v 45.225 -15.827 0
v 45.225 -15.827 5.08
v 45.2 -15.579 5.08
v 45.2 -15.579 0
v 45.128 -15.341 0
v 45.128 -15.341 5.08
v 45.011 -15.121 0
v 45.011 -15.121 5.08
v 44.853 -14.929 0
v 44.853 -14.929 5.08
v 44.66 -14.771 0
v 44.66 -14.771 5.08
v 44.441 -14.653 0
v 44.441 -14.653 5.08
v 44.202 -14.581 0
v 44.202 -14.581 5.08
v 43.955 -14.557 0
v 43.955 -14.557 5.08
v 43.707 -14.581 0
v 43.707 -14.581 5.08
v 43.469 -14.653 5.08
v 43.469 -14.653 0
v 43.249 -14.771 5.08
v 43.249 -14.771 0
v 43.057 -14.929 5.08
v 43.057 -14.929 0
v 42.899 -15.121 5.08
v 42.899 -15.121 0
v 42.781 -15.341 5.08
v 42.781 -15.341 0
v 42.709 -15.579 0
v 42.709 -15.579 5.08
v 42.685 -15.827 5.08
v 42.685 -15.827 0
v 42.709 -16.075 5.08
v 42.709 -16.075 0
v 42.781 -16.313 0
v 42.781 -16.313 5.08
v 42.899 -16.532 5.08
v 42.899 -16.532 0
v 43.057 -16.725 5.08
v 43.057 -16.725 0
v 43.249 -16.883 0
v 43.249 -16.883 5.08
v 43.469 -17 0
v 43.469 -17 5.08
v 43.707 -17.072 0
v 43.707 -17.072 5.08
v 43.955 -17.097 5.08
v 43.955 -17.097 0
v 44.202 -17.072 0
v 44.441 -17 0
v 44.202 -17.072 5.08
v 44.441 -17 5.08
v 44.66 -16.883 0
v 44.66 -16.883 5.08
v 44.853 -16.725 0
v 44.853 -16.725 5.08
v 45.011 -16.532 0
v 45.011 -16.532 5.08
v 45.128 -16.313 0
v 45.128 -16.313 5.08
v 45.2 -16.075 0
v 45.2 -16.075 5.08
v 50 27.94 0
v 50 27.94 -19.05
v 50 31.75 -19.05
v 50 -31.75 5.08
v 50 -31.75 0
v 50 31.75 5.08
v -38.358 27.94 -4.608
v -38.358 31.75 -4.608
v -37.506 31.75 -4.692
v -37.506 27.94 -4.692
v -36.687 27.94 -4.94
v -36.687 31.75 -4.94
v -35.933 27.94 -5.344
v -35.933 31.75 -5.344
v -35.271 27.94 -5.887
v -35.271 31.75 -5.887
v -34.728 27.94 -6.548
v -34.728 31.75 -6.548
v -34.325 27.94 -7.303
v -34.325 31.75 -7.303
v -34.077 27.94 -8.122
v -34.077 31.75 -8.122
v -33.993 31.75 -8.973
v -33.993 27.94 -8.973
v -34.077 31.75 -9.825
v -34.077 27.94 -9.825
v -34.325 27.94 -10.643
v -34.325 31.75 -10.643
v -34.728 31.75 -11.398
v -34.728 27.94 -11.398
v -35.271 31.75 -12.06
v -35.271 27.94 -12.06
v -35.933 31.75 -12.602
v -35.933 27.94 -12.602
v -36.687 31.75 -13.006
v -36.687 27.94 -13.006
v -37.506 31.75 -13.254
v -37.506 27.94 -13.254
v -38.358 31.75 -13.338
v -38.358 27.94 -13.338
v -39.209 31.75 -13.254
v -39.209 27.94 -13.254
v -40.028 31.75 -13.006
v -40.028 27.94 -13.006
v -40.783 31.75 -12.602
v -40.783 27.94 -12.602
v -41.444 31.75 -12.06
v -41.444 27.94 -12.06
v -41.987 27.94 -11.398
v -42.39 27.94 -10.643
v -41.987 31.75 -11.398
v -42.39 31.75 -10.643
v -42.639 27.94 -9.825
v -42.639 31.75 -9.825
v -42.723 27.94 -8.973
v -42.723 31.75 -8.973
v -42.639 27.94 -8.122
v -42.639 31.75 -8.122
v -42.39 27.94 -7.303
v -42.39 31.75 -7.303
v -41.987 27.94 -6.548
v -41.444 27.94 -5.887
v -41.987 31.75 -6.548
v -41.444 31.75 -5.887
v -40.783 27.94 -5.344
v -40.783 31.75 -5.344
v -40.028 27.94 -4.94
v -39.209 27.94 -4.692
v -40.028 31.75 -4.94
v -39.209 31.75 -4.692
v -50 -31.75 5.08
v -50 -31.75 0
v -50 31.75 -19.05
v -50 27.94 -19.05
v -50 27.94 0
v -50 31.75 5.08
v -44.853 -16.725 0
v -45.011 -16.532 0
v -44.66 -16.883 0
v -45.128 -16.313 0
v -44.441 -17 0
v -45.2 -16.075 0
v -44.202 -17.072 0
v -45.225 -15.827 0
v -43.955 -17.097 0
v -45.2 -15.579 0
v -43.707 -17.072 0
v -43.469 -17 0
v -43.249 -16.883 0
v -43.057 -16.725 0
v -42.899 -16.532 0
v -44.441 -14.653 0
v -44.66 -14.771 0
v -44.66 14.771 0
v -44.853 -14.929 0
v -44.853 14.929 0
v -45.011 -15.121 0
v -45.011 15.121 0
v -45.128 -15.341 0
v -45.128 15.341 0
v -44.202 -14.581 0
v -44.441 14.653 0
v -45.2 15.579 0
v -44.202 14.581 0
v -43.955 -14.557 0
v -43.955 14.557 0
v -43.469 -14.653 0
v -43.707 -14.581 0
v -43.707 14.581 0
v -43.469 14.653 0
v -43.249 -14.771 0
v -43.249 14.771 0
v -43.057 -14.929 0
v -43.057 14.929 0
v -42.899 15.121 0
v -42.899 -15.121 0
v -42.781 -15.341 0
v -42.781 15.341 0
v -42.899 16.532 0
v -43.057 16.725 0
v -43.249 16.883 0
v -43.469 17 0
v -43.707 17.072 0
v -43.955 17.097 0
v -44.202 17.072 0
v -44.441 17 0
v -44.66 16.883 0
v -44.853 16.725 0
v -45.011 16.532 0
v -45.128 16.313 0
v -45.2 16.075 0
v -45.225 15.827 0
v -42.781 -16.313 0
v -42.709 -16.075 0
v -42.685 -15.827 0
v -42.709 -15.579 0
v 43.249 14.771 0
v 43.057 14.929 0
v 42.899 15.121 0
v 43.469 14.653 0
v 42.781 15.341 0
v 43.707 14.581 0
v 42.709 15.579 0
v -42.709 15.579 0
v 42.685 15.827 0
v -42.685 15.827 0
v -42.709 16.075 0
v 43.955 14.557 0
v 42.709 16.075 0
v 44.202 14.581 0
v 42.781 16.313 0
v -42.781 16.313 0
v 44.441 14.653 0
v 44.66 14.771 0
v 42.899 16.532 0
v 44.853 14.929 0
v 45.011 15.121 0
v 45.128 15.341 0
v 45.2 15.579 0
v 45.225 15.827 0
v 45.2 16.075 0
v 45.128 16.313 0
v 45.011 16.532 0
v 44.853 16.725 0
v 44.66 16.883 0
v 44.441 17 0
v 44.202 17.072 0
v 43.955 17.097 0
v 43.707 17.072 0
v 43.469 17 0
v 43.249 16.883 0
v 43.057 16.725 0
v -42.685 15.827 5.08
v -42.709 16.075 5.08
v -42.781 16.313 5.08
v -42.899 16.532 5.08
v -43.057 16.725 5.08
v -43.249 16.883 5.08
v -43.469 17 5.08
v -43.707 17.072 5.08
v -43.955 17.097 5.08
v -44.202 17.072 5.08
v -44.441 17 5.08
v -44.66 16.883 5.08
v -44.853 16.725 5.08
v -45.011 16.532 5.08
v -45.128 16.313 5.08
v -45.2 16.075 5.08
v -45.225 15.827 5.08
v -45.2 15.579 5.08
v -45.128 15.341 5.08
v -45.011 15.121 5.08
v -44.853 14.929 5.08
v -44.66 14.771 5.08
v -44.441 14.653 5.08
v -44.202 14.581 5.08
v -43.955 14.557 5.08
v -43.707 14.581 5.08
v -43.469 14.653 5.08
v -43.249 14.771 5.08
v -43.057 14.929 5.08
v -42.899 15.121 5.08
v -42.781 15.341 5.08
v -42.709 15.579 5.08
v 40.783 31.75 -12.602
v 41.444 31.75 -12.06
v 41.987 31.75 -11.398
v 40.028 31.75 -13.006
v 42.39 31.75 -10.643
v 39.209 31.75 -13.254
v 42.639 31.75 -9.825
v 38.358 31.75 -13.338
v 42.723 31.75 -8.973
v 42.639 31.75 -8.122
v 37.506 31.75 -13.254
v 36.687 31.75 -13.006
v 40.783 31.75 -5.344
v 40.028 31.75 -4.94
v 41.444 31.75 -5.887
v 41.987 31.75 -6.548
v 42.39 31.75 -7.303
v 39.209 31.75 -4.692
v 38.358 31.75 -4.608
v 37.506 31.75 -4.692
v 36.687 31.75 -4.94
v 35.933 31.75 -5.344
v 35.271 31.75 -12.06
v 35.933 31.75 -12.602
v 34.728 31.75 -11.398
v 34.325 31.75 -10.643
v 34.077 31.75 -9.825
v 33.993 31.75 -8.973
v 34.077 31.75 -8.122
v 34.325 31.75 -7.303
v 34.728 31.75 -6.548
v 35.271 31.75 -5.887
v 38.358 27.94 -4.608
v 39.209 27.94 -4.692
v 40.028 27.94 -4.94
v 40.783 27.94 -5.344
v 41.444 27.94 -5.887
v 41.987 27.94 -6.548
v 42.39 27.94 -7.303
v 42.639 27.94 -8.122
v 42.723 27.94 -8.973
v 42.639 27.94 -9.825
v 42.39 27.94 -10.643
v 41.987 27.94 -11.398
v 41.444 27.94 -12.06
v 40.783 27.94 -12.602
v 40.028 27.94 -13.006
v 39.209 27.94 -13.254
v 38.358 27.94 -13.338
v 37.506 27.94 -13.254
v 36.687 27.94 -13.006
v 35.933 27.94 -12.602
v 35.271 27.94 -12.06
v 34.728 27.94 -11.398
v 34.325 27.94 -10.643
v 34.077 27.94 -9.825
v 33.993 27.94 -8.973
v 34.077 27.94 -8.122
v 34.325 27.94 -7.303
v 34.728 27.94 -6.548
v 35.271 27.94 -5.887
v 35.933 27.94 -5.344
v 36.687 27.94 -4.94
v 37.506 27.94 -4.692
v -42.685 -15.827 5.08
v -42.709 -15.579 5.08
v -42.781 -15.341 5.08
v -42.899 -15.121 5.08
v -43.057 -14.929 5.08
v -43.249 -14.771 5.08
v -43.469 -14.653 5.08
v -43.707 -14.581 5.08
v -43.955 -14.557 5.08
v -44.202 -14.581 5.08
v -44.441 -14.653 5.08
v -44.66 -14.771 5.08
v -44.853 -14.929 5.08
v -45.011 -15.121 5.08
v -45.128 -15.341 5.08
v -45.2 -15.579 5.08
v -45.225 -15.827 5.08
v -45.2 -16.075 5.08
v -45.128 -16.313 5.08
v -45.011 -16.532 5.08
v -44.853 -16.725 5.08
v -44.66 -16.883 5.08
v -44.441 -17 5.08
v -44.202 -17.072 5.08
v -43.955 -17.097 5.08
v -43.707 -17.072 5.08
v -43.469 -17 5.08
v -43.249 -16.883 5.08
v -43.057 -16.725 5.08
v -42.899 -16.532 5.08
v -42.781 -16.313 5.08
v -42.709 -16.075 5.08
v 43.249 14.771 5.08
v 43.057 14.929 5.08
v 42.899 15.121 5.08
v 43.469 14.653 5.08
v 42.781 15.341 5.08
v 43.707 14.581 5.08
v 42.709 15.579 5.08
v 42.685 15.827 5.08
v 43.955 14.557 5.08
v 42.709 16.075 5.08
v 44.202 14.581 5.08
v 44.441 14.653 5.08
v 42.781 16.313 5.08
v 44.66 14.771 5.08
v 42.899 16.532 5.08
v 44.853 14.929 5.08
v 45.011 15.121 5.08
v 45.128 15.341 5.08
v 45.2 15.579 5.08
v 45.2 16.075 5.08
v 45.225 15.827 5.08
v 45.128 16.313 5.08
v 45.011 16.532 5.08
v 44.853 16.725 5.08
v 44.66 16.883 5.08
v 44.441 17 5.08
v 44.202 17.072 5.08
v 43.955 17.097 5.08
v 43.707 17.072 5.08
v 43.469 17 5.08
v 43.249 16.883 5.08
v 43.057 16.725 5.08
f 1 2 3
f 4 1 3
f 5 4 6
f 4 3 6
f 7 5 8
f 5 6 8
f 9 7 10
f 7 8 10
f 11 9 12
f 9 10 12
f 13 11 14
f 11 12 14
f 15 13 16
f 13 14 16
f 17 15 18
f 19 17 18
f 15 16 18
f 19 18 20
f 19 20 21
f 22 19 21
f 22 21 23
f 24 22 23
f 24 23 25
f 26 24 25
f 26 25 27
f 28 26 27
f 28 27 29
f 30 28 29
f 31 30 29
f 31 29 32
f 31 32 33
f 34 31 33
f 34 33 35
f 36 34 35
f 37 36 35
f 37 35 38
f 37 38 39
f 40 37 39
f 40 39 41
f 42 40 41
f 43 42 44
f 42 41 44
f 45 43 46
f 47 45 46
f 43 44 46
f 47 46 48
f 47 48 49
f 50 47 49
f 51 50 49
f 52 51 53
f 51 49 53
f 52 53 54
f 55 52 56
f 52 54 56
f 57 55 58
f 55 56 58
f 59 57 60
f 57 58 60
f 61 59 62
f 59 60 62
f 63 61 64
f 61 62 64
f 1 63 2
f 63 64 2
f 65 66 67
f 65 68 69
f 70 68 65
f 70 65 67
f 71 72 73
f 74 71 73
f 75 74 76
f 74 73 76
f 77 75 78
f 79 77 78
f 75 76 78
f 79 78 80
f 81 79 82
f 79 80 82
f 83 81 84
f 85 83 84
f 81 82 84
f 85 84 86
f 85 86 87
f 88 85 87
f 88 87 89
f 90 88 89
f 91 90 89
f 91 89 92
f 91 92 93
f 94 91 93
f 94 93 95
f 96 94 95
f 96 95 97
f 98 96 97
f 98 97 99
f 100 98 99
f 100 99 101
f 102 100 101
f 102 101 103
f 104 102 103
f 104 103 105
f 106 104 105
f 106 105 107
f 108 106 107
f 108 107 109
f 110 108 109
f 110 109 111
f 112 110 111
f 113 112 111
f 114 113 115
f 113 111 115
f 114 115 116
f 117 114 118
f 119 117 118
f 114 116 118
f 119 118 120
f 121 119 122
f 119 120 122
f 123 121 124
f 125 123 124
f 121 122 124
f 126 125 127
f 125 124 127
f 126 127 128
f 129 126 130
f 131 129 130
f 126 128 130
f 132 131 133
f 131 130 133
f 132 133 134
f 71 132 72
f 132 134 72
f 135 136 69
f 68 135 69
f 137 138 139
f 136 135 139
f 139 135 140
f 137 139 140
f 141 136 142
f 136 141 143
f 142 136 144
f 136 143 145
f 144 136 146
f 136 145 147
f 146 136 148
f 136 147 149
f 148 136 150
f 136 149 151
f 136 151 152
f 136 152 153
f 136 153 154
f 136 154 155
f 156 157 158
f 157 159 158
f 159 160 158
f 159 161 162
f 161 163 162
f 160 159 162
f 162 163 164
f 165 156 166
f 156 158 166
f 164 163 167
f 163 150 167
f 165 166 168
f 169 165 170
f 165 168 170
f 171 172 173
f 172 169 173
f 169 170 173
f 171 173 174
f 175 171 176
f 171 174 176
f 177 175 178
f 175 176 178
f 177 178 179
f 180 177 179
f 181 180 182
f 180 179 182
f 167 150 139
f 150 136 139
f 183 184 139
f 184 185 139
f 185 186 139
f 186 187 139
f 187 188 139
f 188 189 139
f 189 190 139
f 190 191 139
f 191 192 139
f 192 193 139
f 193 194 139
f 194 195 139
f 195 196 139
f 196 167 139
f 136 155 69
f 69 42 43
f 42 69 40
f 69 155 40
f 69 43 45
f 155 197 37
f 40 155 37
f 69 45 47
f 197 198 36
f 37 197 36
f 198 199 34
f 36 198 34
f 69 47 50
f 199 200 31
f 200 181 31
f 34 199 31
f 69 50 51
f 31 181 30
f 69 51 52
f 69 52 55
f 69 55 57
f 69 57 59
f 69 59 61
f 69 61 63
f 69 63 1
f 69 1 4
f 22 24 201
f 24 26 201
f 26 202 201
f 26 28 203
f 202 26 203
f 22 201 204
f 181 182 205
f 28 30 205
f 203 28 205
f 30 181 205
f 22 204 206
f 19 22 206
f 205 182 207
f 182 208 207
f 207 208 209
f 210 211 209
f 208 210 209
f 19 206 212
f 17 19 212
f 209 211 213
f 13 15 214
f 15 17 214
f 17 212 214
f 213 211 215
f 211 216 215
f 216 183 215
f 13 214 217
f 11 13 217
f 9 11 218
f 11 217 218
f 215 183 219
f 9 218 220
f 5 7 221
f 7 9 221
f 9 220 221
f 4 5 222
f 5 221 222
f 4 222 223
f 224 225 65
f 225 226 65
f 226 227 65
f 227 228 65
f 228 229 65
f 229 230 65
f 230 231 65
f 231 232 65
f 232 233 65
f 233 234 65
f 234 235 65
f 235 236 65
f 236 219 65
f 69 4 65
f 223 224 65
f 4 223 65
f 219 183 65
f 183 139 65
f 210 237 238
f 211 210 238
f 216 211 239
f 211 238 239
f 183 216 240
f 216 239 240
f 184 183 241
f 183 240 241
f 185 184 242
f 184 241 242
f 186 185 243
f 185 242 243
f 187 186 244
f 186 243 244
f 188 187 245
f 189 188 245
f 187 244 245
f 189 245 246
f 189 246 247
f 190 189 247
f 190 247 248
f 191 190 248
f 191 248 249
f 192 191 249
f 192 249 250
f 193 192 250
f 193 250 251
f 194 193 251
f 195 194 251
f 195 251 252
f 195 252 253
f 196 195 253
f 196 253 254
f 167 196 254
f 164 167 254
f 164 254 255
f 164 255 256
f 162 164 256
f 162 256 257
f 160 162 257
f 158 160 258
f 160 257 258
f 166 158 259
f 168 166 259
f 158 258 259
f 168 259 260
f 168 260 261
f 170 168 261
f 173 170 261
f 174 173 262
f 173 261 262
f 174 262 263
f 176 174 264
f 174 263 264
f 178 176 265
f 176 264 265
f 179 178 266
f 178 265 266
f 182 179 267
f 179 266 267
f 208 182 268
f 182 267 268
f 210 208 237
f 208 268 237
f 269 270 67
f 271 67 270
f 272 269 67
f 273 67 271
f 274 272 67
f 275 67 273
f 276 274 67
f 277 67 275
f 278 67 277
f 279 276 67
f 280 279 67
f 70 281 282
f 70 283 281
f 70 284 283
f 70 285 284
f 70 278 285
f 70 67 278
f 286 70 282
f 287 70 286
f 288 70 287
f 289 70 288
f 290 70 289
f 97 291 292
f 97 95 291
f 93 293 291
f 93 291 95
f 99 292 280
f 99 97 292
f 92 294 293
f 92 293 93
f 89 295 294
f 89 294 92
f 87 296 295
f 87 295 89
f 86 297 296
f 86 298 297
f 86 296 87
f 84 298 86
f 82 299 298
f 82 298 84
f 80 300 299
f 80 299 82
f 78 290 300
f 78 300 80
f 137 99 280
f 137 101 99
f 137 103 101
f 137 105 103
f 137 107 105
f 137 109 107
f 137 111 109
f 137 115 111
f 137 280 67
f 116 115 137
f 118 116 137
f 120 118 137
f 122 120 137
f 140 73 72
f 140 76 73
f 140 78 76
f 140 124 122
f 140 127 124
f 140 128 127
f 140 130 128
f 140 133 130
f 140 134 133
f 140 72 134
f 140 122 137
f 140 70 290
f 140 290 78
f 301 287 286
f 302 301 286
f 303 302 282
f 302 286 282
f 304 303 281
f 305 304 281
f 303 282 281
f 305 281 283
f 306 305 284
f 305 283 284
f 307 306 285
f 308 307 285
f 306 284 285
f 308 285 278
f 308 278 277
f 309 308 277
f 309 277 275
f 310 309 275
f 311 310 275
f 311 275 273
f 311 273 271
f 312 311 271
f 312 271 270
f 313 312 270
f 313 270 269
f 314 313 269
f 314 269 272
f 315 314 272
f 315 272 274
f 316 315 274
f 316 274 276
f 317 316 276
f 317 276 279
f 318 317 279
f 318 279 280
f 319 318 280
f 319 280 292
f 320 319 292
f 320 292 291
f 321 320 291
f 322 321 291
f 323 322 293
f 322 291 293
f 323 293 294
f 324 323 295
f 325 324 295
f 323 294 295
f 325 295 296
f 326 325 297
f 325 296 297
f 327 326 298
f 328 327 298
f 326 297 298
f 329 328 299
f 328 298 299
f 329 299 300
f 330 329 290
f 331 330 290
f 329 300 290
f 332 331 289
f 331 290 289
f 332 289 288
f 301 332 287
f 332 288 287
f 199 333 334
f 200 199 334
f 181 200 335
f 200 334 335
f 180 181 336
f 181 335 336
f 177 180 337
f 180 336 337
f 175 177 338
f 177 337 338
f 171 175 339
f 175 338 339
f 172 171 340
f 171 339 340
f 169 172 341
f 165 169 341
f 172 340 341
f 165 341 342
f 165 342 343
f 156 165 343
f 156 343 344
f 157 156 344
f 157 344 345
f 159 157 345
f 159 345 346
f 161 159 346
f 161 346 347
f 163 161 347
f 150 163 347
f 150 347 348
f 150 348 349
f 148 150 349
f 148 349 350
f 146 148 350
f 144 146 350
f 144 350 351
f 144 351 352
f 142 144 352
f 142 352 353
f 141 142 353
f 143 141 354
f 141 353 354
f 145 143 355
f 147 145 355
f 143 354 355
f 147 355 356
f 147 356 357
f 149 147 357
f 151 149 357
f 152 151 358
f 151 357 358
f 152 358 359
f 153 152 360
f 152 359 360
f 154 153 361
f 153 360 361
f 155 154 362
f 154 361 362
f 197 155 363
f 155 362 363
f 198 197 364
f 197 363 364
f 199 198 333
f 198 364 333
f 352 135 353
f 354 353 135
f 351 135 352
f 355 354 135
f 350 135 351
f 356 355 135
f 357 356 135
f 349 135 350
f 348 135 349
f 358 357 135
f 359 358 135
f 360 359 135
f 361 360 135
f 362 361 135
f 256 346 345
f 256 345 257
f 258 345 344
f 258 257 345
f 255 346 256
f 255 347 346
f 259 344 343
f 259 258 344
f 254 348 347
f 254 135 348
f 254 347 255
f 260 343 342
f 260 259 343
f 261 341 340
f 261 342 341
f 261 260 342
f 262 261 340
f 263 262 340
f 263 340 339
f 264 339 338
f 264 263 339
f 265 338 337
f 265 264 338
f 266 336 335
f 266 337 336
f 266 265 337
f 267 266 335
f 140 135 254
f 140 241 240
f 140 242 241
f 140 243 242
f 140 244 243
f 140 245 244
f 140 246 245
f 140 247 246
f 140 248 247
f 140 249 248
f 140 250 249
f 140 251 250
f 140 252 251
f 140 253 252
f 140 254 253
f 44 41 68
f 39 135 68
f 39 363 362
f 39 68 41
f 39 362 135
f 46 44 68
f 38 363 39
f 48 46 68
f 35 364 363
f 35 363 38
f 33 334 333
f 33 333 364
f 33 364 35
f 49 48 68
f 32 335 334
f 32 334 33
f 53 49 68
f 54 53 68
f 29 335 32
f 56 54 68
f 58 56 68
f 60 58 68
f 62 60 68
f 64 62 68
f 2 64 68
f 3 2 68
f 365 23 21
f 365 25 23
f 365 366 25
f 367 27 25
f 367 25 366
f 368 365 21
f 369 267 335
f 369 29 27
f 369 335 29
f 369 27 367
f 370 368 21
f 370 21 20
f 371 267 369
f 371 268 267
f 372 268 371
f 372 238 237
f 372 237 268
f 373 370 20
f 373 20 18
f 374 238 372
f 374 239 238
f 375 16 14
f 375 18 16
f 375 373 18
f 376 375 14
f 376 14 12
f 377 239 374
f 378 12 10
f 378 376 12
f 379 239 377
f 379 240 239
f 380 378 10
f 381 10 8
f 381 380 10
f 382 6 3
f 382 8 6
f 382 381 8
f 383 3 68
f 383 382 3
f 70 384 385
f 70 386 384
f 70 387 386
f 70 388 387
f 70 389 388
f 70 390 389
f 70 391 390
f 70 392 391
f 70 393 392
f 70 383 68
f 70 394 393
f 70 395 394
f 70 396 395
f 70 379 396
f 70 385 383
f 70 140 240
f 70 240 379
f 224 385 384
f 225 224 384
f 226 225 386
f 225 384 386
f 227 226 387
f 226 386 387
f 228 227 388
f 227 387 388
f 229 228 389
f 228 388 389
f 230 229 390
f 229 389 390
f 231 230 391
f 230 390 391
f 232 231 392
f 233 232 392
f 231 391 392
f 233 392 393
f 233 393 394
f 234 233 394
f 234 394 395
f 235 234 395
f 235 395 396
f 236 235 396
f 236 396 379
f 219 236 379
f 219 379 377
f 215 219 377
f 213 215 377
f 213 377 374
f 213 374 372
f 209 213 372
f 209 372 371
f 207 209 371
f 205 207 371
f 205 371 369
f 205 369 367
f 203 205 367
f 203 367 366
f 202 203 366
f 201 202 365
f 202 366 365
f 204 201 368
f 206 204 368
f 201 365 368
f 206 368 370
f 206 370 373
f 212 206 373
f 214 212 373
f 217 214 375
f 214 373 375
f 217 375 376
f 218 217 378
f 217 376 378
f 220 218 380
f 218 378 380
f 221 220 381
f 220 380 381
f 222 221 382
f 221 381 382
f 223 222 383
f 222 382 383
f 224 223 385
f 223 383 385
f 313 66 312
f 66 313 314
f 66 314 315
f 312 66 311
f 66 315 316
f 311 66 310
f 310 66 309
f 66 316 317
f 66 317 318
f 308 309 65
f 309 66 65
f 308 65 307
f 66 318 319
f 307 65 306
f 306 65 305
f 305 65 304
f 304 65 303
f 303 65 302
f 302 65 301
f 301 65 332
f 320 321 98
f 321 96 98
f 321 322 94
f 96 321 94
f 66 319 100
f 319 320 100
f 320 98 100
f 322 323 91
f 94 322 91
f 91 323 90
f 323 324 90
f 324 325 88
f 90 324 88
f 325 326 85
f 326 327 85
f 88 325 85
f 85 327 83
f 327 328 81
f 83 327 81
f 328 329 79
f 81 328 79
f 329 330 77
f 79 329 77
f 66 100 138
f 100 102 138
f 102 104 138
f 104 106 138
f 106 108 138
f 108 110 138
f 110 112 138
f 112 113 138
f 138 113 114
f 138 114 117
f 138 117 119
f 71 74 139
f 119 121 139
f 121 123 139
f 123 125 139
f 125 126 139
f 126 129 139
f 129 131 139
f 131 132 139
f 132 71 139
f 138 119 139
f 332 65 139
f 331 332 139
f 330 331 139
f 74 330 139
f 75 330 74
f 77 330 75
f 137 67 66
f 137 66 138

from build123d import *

# Parameters (mm, degrees)
SKETCH1_W           = 100
SKETCH1_H           = 63.5
BOSS_EXTRUDE1_DEPTH = 5.08
SKETCH3_W           = 100
SKETCH3_H           = 3.81
BOSS_EXTRUDE2_DEPTH = 19.05
SKETCH8_R           = 4.364936917
CUT_EXTRUDE2_DEPTH  = 84.037054981
SKETCH11_R          = 1.27
CUT_EXTRUDE5_DEPTH  = 64.955604915


with BuildPart() as part:
    # Sketch1 → Boss-Extrude1 (new body)
    with BuildSketch(Plane.XY):
        Rectangle(SKETCH1_W, SKETCH1_H)
    extrude(amount=BOSS_EXTRUDE1_DEPTH)

    # Sketch3 → Boss-Extrude2 (add)
    with BuildSketch(Plane(origin=(0, 0, 0), x_dir=(-1, 0, 0), z_dir=(0, 0, -1))):
        with Locations((0, 29.845)):
            Rectangle(SKETCH3_W, SKETCH3_H)
    extrude(amount=BOSS_EXTRUDE2_DEPTH)

    # Sketch8 → Cut-Extrude2 (cut, through all)
    with BuildSketch(Plane(origin=(0, 31.75, 0), x_dir=(1, 0, 0), z_dir=(0, 1, 0))):
        with Locations(Location((-38.35758865, 8.973092831, 0), (0, 0, 270))):
            Circle(SKETCH8_R)
        with Locations(Location((38.35758865, 8.973092831, 0), (0, 0, 270))):
            Circle(SKETCH8_R)
    extrude(amount=-CUT_EXTRUDE2_DEPTH, mode=Mode.SUBTRACT)

    # Sketch11 → Cut-Extrude5 (cut, through all)
    with BuildSketch(Plane.XY.offset(5.08)):
        with Locations((-43.9547, 15.82674)):
            Circle(SKETCH11_R)
        with Locations((-43.9547, -15.82674)):
            Circle(SKETCH11_R)
        with Locations((43.9547, -15.82674)):
            Circle(SKETCH11_R)
        with Locations((43.9547, 15.82674)):
            Circle(SKETCH11_R)
    extrude(amount=-CUT_EXTRUDE5_DEPTH, mode=Mode.SUBTRACT)


solid = part.part
